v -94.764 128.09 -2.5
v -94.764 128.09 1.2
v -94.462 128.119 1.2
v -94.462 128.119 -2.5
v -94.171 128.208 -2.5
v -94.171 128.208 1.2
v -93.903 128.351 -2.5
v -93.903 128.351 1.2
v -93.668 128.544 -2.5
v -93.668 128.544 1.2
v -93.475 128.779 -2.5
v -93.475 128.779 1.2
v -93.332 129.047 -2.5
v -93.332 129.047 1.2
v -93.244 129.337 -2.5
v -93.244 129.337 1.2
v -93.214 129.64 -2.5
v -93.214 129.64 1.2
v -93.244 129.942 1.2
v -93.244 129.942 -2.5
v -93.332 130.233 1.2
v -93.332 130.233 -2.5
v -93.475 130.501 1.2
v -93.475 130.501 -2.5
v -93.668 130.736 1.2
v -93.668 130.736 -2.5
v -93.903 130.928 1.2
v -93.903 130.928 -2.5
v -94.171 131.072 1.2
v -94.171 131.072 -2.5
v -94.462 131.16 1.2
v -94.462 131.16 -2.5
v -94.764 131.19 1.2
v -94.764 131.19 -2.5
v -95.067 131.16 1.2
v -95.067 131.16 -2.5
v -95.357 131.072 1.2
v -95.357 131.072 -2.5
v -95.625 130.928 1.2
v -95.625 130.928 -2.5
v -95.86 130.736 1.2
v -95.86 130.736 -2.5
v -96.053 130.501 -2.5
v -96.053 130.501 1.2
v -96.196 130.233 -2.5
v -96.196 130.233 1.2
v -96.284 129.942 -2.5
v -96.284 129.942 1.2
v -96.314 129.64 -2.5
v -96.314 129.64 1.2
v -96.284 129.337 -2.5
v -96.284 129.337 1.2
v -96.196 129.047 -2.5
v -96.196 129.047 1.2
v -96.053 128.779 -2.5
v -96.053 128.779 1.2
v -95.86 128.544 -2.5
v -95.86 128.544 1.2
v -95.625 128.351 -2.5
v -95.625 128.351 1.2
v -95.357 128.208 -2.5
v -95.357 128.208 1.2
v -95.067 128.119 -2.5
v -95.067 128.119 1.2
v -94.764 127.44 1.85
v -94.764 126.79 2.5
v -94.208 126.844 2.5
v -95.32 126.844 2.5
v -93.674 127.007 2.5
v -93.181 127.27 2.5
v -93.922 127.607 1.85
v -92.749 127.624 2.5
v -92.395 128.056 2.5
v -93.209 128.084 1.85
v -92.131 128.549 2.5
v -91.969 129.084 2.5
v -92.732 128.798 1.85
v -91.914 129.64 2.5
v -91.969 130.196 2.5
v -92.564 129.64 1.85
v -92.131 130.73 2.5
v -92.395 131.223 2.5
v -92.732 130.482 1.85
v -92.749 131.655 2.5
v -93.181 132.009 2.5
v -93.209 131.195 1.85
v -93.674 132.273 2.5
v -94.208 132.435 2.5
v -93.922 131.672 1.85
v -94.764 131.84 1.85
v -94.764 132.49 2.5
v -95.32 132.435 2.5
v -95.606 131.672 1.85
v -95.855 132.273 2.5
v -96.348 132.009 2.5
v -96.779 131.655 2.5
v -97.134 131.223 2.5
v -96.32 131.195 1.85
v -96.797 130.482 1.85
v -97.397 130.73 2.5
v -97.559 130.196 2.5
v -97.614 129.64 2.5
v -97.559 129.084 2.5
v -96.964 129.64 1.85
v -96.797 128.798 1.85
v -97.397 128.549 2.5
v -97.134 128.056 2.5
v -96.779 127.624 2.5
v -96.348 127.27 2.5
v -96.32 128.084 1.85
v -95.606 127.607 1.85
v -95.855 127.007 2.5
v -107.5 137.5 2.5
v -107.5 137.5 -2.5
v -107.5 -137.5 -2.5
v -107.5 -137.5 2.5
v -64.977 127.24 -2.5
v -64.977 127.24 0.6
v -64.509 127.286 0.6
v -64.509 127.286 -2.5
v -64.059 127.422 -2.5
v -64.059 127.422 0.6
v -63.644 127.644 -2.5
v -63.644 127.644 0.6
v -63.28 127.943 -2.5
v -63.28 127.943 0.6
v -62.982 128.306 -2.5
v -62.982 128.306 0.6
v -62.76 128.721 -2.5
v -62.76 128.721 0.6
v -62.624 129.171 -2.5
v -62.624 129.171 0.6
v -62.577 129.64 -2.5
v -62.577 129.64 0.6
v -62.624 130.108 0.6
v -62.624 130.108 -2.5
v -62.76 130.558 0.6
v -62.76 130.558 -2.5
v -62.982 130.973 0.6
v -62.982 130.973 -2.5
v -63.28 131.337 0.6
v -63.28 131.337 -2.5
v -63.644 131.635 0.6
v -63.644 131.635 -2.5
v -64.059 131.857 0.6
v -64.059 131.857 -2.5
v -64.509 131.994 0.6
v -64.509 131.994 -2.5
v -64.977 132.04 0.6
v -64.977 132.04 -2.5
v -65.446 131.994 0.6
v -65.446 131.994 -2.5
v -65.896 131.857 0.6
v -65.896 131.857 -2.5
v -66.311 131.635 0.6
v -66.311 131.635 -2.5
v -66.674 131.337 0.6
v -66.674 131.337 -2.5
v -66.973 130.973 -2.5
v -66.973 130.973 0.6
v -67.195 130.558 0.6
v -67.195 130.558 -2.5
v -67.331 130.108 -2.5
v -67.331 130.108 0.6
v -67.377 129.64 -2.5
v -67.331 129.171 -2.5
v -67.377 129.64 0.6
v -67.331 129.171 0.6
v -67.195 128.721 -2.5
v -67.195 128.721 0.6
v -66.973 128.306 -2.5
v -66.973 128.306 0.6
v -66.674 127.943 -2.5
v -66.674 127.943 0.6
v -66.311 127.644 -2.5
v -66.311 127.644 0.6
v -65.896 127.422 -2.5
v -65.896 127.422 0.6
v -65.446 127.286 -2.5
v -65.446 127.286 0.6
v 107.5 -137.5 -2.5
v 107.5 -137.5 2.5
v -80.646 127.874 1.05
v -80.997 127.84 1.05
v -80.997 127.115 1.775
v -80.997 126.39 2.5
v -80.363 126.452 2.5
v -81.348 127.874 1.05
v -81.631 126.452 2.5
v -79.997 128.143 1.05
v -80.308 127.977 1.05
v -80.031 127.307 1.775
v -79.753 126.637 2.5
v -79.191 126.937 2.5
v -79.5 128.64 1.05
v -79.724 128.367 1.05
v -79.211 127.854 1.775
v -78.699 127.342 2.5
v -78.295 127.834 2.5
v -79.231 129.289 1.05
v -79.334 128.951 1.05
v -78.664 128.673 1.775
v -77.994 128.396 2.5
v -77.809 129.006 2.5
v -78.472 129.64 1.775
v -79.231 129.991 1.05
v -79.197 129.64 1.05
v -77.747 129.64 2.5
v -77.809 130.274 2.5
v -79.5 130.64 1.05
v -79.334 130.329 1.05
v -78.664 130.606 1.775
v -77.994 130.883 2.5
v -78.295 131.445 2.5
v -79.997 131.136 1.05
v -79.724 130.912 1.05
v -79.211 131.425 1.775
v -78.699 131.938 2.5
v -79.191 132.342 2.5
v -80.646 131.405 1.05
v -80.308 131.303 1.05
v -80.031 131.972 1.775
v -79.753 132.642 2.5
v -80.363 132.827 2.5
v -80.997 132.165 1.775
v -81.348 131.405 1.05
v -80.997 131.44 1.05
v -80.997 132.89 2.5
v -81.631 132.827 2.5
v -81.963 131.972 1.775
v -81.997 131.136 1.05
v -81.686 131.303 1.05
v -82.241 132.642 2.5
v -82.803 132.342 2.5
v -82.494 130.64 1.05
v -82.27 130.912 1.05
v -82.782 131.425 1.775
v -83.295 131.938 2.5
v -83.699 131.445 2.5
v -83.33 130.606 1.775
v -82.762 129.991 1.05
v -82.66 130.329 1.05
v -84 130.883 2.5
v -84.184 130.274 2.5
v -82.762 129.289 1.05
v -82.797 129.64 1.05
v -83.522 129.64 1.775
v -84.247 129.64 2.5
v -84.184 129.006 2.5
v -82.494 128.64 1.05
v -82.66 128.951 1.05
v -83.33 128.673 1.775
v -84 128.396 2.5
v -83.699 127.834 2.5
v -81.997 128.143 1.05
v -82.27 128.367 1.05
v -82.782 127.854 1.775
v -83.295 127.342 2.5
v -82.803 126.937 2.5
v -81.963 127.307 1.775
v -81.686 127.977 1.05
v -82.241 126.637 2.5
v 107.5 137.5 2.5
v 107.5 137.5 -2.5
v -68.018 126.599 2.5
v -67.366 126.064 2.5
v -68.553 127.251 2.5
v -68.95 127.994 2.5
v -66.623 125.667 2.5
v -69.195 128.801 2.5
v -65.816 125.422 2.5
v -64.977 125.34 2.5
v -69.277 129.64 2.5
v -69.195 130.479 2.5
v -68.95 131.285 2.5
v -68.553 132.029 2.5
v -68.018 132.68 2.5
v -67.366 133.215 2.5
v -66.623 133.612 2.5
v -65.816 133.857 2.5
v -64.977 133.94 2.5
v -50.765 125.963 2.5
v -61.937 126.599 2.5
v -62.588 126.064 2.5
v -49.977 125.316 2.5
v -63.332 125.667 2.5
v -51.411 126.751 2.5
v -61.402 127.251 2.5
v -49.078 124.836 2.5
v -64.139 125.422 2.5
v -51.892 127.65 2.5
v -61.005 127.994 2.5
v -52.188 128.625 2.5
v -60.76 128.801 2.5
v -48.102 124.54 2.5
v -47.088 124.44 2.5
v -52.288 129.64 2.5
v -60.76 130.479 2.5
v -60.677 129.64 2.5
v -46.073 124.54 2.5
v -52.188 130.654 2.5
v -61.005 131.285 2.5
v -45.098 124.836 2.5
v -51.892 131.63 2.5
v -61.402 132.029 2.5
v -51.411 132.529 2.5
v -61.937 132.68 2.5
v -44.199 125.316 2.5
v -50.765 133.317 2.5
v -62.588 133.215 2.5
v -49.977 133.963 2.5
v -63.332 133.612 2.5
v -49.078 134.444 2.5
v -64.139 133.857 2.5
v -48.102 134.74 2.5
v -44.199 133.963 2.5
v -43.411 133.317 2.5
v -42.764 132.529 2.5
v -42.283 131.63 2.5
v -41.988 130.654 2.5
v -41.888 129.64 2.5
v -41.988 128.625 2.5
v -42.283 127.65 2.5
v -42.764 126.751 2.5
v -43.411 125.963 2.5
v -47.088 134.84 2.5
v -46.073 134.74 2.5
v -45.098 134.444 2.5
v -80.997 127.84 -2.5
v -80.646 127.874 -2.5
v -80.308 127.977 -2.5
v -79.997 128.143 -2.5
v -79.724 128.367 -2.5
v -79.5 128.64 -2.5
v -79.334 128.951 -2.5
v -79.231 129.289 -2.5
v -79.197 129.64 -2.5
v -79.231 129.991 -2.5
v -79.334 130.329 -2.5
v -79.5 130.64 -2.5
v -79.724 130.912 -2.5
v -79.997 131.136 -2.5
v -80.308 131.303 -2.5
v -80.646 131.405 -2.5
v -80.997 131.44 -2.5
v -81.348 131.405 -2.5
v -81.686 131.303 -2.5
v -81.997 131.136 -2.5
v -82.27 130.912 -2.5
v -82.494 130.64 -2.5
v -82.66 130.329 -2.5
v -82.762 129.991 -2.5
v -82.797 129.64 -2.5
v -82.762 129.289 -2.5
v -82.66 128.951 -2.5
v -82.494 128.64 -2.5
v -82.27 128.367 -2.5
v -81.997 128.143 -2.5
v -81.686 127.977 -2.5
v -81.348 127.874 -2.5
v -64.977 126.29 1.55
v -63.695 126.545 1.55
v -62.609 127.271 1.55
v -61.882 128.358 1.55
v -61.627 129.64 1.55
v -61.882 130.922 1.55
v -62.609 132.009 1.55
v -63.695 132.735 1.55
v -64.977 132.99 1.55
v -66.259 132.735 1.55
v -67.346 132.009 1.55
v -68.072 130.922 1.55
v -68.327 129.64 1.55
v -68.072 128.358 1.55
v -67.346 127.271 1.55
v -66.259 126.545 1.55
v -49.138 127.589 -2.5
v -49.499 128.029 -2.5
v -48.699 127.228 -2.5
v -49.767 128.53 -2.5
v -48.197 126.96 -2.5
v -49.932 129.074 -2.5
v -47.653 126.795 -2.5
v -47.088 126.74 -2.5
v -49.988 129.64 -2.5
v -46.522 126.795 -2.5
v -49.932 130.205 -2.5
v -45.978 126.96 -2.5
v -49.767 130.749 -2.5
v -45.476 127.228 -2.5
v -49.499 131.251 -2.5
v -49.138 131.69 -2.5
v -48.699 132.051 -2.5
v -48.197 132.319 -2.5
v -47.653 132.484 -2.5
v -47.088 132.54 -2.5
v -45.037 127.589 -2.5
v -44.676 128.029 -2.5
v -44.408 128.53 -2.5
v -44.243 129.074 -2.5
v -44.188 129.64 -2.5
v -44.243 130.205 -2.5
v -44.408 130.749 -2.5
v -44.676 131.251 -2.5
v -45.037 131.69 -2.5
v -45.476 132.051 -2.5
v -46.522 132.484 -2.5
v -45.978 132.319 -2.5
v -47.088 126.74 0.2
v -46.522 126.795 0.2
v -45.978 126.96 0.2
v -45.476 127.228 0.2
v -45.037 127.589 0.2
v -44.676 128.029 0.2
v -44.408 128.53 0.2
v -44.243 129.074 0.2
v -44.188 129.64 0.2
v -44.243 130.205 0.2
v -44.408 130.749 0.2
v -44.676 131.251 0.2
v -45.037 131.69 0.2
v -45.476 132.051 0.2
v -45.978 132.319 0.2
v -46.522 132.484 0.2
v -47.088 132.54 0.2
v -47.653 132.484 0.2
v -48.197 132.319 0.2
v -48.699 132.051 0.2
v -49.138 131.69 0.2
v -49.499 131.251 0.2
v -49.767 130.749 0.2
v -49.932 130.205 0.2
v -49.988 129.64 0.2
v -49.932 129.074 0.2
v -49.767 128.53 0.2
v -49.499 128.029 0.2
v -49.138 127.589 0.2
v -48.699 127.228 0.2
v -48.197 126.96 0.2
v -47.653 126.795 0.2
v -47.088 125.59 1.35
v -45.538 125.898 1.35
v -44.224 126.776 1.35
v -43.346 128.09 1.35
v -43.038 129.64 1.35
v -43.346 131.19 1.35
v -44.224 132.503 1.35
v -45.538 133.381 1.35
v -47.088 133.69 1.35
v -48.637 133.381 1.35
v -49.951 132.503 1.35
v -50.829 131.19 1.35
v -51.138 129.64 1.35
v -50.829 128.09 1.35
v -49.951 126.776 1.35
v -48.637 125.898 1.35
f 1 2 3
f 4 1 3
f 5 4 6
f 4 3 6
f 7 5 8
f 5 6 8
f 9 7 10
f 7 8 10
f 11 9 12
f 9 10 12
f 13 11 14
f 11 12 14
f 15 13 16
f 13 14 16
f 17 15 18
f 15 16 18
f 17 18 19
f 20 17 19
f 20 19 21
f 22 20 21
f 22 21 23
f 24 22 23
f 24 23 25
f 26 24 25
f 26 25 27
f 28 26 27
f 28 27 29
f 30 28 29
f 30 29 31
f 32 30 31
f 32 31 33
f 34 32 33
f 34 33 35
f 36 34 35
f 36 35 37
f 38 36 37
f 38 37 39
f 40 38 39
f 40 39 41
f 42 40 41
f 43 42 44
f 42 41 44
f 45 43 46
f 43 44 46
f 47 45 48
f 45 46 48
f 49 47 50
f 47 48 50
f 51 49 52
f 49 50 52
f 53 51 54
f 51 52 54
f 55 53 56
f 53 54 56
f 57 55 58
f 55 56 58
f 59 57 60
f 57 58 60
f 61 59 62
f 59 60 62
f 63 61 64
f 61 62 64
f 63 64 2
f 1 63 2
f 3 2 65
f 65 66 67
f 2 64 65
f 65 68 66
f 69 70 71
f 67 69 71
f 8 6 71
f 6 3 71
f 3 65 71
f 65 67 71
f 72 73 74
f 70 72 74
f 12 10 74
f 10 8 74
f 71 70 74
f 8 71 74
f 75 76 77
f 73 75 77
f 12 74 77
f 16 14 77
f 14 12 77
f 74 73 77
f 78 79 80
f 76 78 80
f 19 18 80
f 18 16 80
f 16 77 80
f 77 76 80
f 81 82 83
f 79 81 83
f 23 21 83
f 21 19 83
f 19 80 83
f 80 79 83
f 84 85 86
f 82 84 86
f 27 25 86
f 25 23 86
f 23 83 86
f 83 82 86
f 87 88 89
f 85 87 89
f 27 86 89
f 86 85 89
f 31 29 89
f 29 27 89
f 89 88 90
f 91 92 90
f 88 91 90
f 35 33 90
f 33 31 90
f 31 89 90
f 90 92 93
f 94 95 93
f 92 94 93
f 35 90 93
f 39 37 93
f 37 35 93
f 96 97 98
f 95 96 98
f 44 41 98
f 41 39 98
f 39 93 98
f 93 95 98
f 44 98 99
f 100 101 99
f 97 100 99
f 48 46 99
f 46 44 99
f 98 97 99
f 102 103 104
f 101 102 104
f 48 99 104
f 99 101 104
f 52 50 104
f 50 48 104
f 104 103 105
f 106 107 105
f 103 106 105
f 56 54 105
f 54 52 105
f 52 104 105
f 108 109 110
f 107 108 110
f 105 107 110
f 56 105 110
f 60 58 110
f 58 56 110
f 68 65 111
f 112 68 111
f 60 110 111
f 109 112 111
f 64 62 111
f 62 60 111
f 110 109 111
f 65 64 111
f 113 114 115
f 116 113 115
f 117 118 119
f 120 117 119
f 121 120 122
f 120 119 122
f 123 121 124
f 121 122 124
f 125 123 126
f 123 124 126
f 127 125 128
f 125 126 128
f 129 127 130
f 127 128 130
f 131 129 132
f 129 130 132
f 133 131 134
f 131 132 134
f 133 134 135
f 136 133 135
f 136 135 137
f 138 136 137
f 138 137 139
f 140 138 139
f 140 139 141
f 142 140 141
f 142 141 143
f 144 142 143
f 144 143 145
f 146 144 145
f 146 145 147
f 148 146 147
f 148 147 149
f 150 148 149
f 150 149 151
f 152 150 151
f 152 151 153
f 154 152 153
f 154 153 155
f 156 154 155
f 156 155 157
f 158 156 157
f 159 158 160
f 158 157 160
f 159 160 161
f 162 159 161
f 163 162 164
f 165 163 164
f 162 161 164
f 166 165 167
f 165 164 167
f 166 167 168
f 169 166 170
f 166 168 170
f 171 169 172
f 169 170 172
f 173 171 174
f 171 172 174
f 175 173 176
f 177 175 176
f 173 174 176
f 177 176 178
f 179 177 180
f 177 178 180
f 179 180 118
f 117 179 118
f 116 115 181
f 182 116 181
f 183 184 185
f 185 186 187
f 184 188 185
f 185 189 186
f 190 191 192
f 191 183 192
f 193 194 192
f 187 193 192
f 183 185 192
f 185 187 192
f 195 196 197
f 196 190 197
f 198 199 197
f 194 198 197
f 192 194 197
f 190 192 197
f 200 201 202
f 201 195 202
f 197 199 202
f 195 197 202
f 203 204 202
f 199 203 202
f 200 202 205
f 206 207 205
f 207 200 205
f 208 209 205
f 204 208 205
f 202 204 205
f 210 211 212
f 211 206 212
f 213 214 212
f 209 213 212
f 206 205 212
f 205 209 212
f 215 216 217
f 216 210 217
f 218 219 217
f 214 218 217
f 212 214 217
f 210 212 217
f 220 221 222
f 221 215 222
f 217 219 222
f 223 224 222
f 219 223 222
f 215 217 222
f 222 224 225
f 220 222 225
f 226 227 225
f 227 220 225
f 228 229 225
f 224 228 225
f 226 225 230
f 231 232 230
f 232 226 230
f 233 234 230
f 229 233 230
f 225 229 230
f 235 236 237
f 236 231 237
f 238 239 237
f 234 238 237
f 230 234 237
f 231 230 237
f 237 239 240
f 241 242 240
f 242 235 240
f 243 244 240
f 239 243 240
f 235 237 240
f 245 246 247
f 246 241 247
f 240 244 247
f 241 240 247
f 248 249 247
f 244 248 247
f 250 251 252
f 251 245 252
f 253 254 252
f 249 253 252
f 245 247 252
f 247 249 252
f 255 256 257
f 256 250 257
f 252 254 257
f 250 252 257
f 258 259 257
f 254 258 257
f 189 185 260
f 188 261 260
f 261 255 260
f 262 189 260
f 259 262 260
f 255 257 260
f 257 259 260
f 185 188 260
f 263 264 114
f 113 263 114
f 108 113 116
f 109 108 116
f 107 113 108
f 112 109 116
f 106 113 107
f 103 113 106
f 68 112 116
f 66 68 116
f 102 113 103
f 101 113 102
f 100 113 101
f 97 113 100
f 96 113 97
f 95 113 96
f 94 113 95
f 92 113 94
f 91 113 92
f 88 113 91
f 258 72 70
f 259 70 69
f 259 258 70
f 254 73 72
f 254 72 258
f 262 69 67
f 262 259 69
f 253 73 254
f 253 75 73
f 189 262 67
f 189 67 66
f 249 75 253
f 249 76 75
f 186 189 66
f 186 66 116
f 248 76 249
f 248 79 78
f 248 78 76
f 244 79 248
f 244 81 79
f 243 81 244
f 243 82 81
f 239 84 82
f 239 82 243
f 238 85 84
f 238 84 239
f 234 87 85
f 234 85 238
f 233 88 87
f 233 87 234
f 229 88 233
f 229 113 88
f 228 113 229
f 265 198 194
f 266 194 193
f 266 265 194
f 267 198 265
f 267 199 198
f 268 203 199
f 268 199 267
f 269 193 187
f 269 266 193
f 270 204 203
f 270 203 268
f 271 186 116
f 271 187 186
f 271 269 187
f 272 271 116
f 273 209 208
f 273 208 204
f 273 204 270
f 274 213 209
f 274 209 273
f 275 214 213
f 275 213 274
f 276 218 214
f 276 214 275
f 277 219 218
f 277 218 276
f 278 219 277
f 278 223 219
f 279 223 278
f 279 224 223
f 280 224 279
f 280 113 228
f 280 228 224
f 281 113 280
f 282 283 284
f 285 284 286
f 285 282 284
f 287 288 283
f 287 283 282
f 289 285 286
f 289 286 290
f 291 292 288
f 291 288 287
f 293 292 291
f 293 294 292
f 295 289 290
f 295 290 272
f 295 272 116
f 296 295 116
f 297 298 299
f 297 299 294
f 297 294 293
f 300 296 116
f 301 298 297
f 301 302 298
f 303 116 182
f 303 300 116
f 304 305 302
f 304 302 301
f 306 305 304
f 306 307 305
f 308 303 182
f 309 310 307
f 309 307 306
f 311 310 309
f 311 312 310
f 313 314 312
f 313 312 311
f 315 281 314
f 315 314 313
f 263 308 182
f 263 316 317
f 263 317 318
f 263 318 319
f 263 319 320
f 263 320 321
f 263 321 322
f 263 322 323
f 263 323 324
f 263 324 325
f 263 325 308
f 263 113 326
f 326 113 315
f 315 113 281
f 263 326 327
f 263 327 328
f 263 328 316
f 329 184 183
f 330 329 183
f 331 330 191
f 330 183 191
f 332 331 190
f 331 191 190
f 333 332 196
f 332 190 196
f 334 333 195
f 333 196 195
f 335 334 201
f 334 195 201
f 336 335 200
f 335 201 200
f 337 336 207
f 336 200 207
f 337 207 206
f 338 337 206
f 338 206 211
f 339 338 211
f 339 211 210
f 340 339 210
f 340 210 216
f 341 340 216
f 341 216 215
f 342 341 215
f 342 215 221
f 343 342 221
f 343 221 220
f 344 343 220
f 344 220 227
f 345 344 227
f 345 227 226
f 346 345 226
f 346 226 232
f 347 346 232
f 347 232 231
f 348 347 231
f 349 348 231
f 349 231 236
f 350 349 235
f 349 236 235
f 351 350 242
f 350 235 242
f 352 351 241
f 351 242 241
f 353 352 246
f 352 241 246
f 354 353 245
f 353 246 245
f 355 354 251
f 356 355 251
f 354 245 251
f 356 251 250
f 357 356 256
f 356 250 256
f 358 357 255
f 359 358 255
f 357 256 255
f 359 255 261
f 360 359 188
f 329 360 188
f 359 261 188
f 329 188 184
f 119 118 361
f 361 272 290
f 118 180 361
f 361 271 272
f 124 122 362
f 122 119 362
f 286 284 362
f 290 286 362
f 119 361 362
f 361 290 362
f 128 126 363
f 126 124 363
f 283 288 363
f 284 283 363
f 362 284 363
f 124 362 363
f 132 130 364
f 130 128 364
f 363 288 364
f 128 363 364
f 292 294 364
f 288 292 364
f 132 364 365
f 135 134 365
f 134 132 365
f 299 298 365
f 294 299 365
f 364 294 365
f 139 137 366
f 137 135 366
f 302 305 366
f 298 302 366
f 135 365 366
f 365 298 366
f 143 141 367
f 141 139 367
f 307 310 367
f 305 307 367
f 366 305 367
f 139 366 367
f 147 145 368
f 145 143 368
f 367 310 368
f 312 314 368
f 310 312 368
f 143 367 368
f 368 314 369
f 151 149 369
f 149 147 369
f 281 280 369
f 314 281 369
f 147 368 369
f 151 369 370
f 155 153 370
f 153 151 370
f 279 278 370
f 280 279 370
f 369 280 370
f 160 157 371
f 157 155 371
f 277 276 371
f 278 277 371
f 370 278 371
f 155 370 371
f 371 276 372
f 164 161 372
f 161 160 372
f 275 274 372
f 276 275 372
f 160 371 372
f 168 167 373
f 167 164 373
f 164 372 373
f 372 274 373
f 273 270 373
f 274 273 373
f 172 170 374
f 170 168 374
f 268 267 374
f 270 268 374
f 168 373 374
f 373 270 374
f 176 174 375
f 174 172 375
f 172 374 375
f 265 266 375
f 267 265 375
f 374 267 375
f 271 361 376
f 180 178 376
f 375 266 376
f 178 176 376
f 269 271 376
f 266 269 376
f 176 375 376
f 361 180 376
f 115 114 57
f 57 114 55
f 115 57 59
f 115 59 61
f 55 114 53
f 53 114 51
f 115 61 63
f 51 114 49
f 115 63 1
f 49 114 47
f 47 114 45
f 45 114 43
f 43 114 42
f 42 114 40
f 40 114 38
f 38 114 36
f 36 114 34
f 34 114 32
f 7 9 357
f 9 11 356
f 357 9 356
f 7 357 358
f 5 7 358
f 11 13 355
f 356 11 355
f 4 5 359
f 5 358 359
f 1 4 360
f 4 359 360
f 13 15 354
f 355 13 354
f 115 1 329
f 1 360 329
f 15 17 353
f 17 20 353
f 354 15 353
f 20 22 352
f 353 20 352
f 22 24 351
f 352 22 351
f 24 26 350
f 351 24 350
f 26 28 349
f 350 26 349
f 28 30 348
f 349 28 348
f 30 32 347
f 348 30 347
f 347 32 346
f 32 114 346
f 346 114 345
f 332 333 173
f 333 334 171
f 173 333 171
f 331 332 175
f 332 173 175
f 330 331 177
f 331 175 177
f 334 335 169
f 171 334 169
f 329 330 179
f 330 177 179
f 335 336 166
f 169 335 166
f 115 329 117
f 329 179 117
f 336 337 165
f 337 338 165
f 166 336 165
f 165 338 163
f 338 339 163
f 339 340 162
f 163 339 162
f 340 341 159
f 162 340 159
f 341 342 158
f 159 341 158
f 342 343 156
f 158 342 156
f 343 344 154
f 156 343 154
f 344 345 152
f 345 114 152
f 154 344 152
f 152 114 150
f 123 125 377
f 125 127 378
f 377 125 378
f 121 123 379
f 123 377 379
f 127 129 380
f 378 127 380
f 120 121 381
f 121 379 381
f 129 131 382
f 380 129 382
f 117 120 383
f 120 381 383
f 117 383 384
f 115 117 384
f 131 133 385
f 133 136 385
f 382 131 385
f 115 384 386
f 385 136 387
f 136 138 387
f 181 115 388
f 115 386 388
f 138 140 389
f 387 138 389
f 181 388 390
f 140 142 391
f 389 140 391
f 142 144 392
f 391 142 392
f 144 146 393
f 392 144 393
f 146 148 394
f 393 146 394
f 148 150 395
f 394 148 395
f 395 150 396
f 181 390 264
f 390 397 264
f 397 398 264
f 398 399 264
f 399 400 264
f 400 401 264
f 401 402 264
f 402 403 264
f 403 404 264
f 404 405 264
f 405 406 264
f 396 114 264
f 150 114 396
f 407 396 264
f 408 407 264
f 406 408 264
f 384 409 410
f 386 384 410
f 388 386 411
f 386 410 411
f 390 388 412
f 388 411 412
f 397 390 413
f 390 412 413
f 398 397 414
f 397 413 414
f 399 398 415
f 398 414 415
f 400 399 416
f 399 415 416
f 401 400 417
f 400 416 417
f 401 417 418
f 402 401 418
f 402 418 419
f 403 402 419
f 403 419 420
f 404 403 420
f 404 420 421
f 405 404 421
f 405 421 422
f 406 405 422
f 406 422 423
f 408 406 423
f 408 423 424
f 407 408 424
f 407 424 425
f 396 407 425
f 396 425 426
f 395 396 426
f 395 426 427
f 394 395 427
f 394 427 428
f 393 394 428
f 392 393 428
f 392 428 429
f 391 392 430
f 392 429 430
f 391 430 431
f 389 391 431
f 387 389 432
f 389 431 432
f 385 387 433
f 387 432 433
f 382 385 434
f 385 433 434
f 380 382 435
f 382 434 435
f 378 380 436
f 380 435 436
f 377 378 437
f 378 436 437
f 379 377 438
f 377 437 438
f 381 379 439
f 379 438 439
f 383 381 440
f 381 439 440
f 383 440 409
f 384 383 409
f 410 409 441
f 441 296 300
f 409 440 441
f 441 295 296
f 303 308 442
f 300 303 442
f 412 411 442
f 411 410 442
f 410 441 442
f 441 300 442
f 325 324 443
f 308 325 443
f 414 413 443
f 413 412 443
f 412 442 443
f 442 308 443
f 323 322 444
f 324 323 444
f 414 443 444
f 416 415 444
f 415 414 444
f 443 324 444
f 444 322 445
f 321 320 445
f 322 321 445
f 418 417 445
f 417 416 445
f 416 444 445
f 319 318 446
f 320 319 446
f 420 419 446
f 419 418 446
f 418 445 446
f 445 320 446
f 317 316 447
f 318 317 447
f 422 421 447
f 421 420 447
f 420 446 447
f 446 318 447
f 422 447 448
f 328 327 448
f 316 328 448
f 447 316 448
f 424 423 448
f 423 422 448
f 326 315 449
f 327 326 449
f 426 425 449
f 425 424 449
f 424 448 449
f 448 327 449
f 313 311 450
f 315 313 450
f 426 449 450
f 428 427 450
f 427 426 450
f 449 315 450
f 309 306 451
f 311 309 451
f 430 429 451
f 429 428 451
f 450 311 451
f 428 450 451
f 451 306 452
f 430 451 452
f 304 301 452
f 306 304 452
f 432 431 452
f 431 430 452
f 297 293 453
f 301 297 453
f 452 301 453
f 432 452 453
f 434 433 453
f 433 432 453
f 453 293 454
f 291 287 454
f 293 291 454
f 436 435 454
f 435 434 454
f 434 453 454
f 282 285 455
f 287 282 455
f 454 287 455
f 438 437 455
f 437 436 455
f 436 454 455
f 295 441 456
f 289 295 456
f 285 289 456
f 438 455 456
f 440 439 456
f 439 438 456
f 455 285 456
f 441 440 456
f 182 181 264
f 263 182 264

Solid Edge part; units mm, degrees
sketch "Sketch1" plane through (0, 0, 0) normal (0, 0, 1) x (1, 0, 0)
  line L0 (-107.5, -137.5) -> (107.5, -137.5)
  line L1 (107.5, -137.5) -> (107.5, 137.5)
  line L2 (107.5, 137.5) -> (-107.5, 137.5)
  line L3 (-107.5, 137.5) -> (-107.5, -137.5)
  dimension "D1" = 215
  dimension "D2" = 275
extrude "Protrusion1" add sketch "Sketch1" along normal mid plane 5
hole "Bohrung_1" at (-94.7642, 129.6397, 2.5) direction (0, 0, -1) diameter 3.1 end up to next countersink diameter 5.7 countersink angle 90
hole "Bohrung_2" at (-80.9969, 129.6397, 2.5) direction (0, 0, -1) diameter 3.6 end up to next countersink diameter 6.5 countersink angle 90
hole "Bohrung_3" at (-64.9774, 129.6397, 2.5) direction (0, 0, -1) diameter 4.8 end up to next countersink diameter 8.6 countersink angle 90
hole "Bohrung_4" at (-47.0876, 129.6397, 2.5) direction (0, 0, -1) diameter 5.8 end up to next countersink diameter 10.4 countersink angle 90
